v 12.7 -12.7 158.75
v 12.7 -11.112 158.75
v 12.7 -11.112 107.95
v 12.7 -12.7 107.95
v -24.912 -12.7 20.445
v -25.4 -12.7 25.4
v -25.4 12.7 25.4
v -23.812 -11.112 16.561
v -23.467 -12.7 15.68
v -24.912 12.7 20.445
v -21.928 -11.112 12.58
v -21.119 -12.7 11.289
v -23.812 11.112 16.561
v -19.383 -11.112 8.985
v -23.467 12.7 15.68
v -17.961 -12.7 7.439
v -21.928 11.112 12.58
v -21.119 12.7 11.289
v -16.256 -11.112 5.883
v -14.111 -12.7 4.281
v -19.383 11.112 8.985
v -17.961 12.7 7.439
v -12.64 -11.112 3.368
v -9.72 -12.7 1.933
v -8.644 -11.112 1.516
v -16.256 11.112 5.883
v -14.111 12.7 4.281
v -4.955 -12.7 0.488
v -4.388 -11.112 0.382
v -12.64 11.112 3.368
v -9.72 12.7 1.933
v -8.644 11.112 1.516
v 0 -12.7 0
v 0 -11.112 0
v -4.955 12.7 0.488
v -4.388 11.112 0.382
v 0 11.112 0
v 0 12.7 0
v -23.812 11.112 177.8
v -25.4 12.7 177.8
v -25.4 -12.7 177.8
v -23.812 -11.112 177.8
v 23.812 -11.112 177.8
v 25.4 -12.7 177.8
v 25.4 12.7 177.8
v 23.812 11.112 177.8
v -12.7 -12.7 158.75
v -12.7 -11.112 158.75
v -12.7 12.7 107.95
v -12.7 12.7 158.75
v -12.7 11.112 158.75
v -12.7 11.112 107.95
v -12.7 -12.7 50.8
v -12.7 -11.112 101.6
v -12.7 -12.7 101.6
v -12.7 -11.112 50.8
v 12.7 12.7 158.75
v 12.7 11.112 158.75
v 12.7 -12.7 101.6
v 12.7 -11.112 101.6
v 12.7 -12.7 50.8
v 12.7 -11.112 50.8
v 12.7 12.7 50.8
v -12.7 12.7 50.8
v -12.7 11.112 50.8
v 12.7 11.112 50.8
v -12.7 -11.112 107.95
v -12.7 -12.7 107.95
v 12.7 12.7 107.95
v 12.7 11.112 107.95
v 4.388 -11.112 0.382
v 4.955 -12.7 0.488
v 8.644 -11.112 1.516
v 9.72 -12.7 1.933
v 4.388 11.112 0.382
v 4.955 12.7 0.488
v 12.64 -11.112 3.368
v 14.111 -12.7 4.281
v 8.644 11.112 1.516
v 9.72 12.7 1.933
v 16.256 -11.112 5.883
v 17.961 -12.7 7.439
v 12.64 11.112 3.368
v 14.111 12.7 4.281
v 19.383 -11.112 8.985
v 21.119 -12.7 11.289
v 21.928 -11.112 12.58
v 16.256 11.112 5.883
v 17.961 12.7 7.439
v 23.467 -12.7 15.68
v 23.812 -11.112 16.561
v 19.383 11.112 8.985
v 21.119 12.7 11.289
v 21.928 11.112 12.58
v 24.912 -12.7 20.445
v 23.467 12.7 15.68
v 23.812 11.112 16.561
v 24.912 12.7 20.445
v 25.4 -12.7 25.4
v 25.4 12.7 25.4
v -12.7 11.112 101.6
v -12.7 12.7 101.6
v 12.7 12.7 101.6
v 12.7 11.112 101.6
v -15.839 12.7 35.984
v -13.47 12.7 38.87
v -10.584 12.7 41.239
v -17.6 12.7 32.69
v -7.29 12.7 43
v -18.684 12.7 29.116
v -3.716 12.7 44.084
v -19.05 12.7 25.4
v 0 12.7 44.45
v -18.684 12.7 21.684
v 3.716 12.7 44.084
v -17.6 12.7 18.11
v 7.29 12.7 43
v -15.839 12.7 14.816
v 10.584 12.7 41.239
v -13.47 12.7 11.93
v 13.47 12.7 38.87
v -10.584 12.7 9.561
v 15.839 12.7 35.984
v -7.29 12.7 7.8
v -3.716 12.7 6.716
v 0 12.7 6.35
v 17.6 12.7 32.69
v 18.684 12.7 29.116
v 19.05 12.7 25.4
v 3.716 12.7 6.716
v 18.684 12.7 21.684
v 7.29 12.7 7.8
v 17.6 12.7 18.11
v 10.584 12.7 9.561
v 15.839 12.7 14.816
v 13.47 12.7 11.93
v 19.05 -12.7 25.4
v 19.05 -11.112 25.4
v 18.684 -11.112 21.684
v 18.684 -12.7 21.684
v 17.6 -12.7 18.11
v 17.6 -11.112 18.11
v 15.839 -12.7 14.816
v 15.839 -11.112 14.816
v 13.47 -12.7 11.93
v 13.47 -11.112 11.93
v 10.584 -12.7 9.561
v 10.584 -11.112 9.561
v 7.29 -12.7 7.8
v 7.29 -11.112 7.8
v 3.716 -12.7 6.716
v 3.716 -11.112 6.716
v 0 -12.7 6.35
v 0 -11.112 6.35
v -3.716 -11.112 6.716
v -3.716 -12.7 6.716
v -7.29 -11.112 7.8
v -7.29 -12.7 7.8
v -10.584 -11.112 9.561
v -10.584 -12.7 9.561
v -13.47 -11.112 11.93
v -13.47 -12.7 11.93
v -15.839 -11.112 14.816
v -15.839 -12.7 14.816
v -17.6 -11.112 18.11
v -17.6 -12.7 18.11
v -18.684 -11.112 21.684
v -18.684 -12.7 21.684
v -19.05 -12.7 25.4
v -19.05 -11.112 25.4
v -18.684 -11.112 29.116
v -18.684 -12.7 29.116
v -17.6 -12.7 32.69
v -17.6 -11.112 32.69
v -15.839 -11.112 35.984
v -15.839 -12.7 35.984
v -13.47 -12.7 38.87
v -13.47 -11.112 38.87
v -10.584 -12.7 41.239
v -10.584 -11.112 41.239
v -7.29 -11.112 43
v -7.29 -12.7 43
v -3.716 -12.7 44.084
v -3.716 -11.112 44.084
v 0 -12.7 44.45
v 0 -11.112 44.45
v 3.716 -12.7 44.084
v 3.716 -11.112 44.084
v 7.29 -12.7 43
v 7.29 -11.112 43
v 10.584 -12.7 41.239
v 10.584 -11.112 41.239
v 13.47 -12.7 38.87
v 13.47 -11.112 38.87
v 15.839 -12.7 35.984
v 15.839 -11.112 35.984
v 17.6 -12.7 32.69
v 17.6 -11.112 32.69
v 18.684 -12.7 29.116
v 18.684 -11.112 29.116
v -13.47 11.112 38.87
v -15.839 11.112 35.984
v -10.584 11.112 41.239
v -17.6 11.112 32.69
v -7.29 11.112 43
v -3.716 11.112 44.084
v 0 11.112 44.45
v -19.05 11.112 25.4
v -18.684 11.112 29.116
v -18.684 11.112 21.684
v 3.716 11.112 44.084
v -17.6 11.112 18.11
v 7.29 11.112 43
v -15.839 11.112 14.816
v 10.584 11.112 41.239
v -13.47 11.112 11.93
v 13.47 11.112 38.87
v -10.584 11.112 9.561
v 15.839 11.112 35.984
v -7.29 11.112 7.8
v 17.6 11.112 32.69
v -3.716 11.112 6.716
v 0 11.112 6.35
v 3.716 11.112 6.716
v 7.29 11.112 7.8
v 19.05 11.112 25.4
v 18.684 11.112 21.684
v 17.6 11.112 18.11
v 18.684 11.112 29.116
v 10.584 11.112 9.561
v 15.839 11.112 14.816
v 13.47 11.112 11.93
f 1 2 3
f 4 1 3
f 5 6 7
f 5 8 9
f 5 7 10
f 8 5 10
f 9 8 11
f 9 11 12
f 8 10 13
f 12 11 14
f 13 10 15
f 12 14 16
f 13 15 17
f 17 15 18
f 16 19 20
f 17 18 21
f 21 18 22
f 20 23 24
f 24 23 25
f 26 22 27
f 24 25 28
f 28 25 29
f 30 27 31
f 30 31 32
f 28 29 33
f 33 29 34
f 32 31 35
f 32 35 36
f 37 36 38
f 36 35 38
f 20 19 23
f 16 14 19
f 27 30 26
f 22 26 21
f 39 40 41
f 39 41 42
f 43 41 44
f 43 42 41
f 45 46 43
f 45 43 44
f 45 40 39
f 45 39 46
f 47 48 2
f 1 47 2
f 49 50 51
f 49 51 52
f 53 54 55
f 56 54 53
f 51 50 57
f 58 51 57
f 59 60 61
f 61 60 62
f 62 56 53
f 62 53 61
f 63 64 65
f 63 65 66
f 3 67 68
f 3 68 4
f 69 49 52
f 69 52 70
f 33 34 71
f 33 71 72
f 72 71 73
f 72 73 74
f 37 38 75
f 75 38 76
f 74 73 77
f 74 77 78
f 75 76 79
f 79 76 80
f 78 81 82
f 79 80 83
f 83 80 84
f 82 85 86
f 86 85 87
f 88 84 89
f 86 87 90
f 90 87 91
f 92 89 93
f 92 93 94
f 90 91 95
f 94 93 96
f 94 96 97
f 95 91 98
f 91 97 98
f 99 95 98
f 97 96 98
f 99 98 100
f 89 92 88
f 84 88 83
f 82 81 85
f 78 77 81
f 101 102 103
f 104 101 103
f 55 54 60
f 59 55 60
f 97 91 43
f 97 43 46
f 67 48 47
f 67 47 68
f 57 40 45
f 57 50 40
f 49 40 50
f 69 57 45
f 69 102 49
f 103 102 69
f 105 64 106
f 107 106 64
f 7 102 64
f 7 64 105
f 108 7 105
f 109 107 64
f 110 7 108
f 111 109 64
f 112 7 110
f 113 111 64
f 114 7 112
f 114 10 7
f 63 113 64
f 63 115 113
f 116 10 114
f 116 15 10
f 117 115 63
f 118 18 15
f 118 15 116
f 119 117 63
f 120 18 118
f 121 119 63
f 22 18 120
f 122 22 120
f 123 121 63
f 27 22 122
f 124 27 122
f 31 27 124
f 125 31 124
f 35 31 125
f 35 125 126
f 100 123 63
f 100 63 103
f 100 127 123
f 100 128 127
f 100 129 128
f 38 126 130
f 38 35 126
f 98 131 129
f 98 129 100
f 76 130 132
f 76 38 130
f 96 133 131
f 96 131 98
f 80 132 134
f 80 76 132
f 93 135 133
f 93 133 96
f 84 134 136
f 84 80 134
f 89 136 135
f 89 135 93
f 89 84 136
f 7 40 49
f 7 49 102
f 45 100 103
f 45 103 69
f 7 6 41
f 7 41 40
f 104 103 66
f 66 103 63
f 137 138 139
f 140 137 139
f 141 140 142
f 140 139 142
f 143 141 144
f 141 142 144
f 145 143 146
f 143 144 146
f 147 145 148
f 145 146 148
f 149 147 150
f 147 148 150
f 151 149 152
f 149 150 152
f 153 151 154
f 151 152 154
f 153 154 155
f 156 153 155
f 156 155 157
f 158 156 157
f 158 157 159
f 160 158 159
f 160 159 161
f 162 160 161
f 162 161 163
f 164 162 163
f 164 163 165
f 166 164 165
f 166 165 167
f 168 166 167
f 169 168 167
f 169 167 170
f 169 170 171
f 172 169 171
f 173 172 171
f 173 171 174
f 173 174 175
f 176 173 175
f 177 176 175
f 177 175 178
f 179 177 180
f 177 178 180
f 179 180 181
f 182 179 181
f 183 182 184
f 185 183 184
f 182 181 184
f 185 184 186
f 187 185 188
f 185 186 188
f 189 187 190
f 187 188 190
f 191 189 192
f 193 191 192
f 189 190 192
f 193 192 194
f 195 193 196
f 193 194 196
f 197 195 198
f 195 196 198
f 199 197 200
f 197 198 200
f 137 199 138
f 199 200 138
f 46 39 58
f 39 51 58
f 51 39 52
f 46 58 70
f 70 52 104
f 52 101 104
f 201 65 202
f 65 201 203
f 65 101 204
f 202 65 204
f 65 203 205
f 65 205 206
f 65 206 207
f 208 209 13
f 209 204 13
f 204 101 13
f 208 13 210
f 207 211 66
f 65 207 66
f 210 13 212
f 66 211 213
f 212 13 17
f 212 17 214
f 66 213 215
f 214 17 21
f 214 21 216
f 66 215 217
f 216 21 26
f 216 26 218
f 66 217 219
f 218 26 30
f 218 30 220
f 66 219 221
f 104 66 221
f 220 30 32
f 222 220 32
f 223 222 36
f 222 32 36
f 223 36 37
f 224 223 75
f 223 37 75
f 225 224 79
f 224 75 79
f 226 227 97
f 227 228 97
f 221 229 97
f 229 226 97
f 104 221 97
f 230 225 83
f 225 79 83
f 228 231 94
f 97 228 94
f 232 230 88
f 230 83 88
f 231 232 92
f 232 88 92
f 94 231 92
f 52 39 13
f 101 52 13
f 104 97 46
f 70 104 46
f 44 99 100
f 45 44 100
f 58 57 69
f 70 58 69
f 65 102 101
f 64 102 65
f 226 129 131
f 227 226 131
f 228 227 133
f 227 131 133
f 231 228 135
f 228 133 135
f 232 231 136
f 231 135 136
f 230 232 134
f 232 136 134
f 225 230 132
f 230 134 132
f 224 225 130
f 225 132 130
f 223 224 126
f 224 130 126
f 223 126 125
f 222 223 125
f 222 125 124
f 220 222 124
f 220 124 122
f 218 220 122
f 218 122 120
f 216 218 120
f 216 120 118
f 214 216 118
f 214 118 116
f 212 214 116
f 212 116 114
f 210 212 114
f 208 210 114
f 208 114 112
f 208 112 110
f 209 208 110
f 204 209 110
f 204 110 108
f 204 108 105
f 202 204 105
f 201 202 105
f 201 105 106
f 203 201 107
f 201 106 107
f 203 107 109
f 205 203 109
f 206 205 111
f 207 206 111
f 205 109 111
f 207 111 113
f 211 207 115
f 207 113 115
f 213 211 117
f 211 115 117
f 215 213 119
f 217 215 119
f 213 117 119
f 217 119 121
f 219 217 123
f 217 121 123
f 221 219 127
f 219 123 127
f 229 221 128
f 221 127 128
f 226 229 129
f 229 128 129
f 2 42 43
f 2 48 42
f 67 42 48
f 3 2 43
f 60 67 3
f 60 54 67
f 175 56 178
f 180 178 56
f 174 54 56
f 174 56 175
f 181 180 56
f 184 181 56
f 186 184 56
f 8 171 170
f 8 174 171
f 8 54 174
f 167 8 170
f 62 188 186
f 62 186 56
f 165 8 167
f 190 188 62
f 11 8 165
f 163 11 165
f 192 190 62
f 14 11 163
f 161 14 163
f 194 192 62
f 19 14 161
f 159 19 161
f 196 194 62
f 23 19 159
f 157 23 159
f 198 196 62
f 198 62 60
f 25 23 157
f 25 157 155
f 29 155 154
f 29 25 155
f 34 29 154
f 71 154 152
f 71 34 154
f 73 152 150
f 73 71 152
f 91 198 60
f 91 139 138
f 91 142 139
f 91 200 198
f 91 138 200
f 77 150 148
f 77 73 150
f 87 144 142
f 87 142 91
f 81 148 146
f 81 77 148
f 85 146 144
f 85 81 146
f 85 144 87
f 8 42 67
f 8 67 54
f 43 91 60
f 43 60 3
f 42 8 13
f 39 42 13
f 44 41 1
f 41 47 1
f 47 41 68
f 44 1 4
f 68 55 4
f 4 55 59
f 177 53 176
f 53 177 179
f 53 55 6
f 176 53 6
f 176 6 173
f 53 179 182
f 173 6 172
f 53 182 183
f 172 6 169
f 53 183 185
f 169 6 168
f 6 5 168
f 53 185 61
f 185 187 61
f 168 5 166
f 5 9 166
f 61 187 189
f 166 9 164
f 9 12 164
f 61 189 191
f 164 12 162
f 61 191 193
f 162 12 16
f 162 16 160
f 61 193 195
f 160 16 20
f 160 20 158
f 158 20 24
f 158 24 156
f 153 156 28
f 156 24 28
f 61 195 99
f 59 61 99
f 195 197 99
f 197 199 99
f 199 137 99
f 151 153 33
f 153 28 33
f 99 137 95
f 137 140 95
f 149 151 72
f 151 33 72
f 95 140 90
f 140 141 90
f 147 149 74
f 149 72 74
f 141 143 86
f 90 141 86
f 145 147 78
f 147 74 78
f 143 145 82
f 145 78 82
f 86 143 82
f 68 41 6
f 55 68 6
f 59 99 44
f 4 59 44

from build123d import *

# Parameters (mm, degrees)
SKETCH1_W           = 50.8
SKETCH1_H           = 25.4
SKETCH1_W_2         = 47.625
SKETCH1_H_2         = 22.225
BOSS_EXTRUDE1_DEPTH = 177.8
CUT_EXTRUDE1_REACH  = 183.392
SKETCH2_W           = 25.4
SKETCH2_H           = 50.8


with BuildPart() as part:
    # Sketch1 → Boss-Extrude1 (new body)
    with BuildSketch(Plane.XY):
        Rectangle(SKETCH1_W, SKETCH1_H)
        Rectangle(SKETCH1_W_2, SKETCH1_H_2, mode=Mode.SUBTRACT)
    extrude(amount=BOSS_EXTRUDE1_DEPTH)

    # Cut-Extrude1: up to this face of the body (flat: up to its plane)
    cut_extrude1_end = Plane(part.part.faces().sort_by_distance((0, -12.7, 88.9))[0])
    # Sketch2 → Cut-Extrude1 (cut, up to the picked face)
    with BuildSketch(Plane(origin=(0, 12.7, 0), x_dir=(1, 0, 0), z_dir=(0, 1, 0)), mode=Mode.PRIVATE) as cut_extrude1_sk1:
        with BuildLine():
            ThreePointArc((-25.4, -25.4), (-17.960512214, -7.439487729), (8.1e-08, 0))
            Line((8.1e-08, 0), (-25.4, 0))
            Line((-25.4, 0), (-25.4, -25.4))
        make_face()
    cut_extrude1_tool1 = split(extrude(cut_extrude1_sk1.sketch, amount=-CUT_EXTRUDE1_REACH, mode=Mode.PRIVATE), bisect_by=cut_extrude1_end, keep=Keep.BOTH, mode=Mode.PRIVATE)
    # Sketch2 → Cut-Extrude1 (cut, up to the picked face)
    with BuildSketch(Plane(origin=(0, 12.7, 0), x_dir=(1, 0, 0), z_dir=(0, 1, 0)), mode=Mode.PRIVATE) as cut_extrude1_sk2:
        with BuildLine():
            ThreePointArc((-19.05, -25.4), (0, -44.45), (19.05, -25.4))
            Line((19.05, -25.4), (-19.05, -25.4))
        make_face()
    cut_extrude1_tool2 = split(extrude(cut_extrude1_sk2.sketch, amount=-CUT_EXTRUDE1_REACH, mode=Mode.PRIVATE), bisect_by=cut_extrude1_end, keep=Keep.BOTH, mode=Mode.PRIVATE)
    # Sketch2 → Cut-Extrude1 (cut, up to the picked face)
    with BuildSketch(Plane(origin=(0, 12.7, 0), x_dir=(1, 0, 0), z_dir=(0, 1, 0)), mode=Mode.PRIVATE) as cut_extrude1_sk3:
        with BuildLine():
            Line((-19.05, -25.4), (19.05, -25.4))
            ThreePointArc((19.05, -25.4), (0, -6.35), (-19.05, -25.4))
        make_face()
    cut_extrude1_tool3 = split(extrude(cut_extrude1_sk3.sketch, amount=-CUT_EXTRUDE1_REACH, mode=Mode.PRIVATE), bisect_by=cut_extrude1_end, keep=Keep.BOTH, mode=Mode.PRIVATE)
    # Sketch2 → Cut-Extrude1 (cut, up to the picked face)
    with BuildSketch(Plane(origin=(0, 12.7, 0), x_dir=(1, 0, 0), z_dir=(0, 1, 0)), mode=Mode.PRIVATE) as cut_extrude1_sk4:
        with BuildLine():
            ThreePointArc((8.1e-08, 0), (17.960512271, -7.439487786), (25.4, -25.4))
            Line((25.4, -25.4), (25.4, 0))
            Line((25.4, 0), (8.1e-08, 0))
        make_face()
    cut_extrude1_tool4 = split(extrude(cut_extrude1_sk4.sketch, amount=-CUT_EXTRUDE1_REACH, mode=Mode.PRIVATE), bisect_by=cut_extrude1_end, keep=Keep.BOTH, mode=Mode.PRIVATE)
    # Sketch2 → Cut-Extrude1 (cut, up to the picked face)
    with BuildSketch(Plane(origin=(0, 12.7, 0), x_dir=(1, 0, 0), z_dir=(0, 1, 0)), mode=Mode.PRIVATE) as cut_extrude1_sk5:
        with BuildLine():
            ThreePointArc((-19.05, -25.4), (0, -44.45), (19.05, -25.4))
            Line((19.05, -25.4), (-19.05, -25.4))
        make_face()
    cut_extrude1_tool5 = split(extrude(cut_extrude1_sk5.sketch, amount=-CUT_EXTRUDE1_REACH, mode=Mode.PRIVATE), bisect_by=cut_extrude1_end, keep=Keep.BOTH, mode=Mode.PRIVATE)
    # Sketch2 → Cut-Extrude1 (cut, up to the picked face)
    with BuildSketch(Plane(origin=(0, 12.7, 0), x_dir=(1, 0, 0), z_dir=(0, 1, 0)), mode=Mode.PRIVATE) as cut_extrude1_sk6:
        with BuildLine():
            Line((-19.05, -25.4), (19.05, -25.4))
            ThreePointArc((19.05, -25.4), (0, -6.35), (-19.05, -25.4))
        make_face()
    cut_extrude1_tool6 = split(extrude(cut_extrude1_sk6.sketch, amount=-CUT_EXTRUDE1_REACH, mode=Mode.PRIVATE), bisect_by=cut_extrude1_end, keep=Keep.BOTH, mode=Mode.PRIVATE)
    # Sketch2 → Cut-Extrude1 (cut, up to the picked face)
    with BuildSketch(Plane(origin=(0, 12.7, 0), x_dir=(1, 0, 0), z_dir=(0, 1, 0)), mode=Mode.PRIVATE) as cut_extrude1_sk7:
        with Locations((0, -133.35)):
            Rectangle(SKETCH2_W, SKETCH2_H)
    cut_extrude1_tool7 = split(extrude(cut_extrude1_sk7.sketch, amount=-CUT_EXTRUDE1_REACH, mode=Mode.PRIVATE), bisect_by=cut_extrude1_end, keep=Keep.BOTH, mode=Mode.PRIVATE)
    # Sketch2 → Cut-Extrude1 (cut, up to the picked face)
    with BuildSketch(Plane(origin=(0, 12.7, 0), x_dir=(1, 0, 0), z_dir=(0, 1, 0)), mode=Mode.PRIVATE) as cut_extrude1_sk8:
        with Locations((0, -76.2)):
            Rectangle(SKETCH2_W, SKETCH2_H)
    cut_extrude1_tool8 = split(extrude(cut_extrude1_sk8.sketch, amount=-CUT_EXTRUDE1_REACH, mode=Mode.PRIVATE), bisect_by=cut_extrude1_end, keep=Keep.BOTH, mode=Mode.PRIVATE)
    add(cut_extrude1_tool1.solids().sort_by(Axis((-19.726454, 12.7, 5.673546), (0, -1, 0)))[0], mode=Mode.SUBTRACT)
    add(cut_extrude1_tool2.solids().sort_by(Axis((0, 12.7, 33.485071), (0, -1, 0)))[0], mode=Mode.SUBTRACT)
    add(cut_extrude1_tool3.solids().sort_by(Axis((0, 12.7, 17.314929), (0, -1, 0)))[0], mode=Mode.SUBTRACT)
    add(cut_extrude1_tool4.solids().sort_by(Axis((19.726454, 12.7, 5.673546), (0, -1, 0)))[0], mode=Mode.SUBTRACT)
    add(cut_extrude1_tool5.solids().sort_by(Axis((0, 12.7, 33.485071), (0, -1, 0)))[0], mode=Mode.SUBTRACT)
    add(cut_extrude1_tool6.solids().sort_by(Axis((0, 12.7, 17.314929), (0, -1, 0)))[0], mode=Mode.SUBTRACT)
    add(cut_extrude1_tool7.solids().sort_by(Axis((0, 12.7, 133.35), (0, -1, 0)))[0], mode=Mode.SUBTRACT)
    add(cut_extrude1_tool8.solids().sort_by(Axis((0, 12.7, 76.2), (0, -1, 0)))[0], mode=Mode.SUBTRACT)


solid = part.part
